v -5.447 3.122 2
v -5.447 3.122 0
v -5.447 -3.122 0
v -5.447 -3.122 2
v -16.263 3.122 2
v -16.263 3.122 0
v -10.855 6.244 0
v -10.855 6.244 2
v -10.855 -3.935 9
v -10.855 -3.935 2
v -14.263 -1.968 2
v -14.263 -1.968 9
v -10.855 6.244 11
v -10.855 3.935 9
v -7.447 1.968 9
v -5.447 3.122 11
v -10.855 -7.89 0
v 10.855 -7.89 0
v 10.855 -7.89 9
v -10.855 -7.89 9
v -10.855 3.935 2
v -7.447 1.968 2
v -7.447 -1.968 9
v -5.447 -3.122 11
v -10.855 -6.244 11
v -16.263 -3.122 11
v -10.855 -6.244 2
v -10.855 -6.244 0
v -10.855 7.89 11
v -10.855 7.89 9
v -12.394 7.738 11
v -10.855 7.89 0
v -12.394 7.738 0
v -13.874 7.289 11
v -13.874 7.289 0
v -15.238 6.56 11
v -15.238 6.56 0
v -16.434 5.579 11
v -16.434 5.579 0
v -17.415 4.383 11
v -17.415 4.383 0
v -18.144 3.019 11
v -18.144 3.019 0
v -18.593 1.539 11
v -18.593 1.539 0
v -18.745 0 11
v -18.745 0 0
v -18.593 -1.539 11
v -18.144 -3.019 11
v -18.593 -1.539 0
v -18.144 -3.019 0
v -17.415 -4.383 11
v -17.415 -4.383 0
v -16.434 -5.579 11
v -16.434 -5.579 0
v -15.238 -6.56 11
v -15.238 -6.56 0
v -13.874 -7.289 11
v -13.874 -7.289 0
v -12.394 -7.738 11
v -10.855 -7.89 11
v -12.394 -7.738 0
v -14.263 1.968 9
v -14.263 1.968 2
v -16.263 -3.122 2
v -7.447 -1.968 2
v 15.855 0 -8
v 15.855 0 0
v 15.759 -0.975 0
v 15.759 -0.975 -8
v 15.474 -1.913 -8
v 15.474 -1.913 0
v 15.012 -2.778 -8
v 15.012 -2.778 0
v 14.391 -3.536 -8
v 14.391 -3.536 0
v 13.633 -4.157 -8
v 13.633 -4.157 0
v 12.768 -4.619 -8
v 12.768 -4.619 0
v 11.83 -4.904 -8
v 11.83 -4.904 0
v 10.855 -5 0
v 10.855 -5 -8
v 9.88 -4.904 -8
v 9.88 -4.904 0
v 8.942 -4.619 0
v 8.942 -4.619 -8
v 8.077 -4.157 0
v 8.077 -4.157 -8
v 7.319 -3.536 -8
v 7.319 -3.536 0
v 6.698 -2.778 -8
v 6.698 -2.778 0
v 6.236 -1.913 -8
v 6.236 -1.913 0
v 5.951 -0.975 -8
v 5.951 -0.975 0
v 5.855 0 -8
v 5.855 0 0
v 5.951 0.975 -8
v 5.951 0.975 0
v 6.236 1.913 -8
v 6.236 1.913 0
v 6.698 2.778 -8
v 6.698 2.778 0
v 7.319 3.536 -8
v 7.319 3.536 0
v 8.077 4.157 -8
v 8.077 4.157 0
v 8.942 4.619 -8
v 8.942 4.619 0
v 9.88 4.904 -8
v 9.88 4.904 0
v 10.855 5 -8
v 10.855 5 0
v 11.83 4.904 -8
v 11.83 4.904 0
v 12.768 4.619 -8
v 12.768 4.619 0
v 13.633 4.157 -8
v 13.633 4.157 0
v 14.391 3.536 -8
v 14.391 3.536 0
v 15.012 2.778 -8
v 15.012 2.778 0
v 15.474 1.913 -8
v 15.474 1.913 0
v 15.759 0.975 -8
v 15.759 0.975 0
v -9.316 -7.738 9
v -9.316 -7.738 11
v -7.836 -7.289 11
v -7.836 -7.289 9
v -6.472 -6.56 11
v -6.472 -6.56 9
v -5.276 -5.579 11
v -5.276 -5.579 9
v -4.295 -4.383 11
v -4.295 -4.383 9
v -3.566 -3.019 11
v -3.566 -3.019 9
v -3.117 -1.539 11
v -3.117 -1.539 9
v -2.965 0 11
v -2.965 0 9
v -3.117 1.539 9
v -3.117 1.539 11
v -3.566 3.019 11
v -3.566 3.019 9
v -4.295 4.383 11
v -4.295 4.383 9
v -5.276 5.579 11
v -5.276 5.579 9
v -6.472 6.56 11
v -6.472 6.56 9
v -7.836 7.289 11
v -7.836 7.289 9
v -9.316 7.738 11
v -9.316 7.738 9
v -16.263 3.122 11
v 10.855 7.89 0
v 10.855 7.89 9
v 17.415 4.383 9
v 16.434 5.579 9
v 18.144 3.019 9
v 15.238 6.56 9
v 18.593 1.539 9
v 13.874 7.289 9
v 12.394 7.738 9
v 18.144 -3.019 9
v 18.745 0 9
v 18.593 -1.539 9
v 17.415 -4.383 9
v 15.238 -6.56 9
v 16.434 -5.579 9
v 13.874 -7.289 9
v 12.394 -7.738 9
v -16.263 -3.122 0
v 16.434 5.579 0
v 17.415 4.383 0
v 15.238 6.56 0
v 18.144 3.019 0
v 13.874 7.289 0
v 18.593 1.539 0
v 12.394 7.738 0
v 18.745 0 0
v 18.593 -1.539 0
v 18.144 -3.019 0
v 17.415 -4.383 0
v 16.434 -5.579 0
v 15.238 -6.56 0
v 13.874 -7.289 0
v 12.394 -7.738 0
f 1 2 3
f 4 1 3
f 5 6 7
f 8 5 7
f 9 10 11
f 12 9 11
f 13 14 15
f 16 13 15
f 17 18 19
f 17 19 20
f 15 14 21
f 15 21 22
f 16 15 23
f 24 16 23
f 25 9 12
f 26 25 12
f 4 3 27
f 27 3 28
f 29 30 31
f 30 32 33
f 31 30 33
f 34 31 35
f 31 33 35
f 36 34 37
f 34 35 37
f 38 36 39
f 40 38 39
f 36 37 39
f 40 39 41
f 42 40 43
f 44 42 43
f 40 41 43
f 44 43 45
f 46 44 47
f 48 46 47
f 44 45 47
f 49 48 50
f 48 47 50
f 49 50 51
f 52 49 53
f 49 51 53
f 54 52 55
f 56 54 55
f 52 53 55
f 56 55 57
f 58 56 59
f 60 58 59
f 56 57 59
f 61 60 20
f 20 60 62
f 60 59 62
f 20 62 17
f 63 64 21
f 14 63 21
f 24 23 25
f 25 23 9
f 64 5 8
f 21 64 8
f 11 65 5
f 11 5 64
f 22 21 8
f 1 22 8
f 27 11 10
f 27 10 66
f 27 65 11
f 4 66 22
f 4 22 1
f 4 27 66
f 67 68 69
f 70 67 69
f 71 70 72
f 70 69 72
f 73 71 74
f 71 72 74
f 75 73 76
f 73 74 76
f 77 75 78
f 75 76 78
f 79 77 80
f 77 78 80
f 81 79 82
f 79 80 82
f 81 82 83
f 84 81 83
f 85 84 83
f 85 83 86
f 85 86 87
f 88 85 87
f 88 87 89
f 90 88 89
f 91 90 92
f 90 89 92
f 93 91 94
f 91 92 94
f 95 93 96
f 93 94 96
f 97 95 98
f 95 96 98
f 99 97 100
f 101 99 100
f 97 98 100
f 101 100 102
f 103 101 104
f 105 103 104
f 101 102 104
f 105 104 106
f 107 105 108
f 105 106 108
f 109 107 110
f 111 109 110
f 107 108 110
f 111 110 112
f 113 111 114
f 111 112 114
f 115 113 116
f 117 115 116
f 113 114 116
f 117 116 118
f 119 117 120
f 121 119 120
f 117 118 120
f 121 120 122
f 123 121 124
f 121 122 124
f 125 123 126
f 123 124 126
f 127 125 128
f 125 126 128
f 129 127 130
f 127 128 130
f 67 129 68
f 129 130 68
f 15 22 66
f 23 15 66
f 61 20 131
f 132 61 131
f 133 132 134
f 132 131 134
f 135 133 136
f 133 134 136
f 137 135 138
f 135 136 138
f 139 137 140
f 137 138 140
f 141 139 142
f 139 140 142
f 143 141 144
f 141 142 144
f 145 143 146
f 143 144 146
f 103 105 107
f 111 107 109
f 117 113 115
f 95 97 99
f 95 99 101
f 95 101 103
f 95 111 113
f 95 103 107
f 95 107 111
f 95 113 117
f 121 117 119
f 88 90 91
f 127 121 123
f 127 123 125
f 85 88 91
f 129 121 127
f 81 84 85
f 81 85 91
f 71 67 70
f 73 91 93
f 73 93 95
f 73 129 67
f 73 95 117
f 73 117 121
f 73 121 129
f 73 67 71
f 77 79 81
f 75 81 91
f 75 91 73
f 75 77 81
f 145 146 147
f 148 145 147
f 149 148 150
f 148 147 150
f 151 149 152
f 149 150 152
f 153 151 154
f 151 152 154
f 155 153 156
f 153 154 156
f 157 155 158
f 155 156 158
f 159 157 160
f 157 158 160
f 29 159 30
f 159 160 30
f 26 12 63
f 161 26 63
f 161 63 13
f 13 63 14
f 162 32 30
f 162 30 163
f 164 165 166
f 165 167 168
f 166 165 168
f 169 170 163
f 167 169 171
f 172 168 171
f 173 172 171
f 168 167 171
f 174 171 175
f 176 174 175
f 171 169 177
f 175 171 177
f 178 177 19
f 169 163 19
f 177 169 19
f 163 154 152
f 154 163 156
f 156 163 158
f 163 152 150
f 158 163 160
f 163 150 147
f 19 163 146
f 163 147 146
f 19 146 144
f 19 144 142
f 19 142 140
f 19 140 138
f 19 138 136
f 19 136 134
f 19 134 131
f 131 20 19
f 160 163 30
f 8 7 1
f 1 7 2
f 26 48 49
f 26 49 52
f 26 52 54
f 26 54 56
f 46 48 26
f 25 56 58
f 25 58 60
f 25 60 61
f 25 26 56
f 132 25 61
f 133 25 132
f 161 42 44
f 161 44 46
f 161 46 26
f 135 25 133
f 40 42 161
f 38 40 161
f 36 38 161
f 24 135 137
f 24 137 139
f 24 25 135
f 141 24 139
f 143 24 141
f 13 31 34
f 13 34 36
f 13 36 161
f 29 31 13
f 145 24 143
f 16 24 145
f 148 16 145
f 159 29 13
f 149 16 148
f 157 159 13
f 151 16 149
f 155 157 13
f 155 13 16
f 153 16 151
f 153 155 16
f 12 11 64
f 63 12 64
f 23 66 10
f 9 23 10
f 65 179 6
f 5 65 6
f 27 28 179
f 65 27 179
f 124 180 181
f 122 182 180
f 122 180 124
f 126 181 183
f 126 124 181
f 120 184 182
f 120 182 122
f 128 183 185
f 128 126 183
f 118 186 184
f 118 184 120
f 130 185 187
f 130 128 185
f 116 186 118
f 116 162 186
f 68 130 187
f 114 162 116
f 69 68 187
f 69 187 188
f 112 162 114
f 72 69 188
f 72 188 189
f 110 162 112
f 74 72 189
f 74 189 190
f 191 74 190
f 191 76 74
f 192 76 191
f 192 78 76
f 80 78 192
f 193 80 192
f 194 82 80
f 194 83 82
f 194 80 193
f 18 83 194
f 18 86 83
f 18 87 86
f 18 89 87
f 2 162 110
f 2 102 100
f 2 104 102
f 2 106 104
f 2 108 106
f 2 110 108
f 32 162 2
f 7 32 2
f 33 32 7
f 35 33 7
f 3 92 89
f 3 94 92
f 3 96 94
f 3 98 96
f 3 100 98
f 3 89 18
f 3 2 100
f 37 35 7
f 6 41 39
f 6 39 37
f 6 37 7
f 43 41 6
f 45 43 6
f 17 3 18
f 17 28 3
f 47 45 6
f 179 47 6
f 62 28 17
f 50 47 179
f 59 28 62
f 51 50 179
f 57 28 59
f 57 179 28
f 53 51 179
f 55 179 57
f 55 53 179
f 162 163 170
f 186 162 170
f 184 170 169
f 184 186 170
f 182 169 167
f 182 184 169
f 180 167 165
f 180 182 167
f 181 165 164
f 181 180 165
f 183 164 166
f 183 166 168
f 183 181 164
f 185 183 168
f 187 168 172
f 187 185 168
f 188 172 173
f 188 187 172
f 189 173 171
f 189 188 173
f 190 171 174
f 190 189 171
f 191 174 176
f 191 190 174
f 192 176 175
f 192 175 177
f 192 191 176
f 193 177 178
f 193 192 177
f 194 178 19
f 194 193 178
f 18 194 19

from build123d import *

# Parameters (mm, degrees)
BOSS_EXTRU_1_DEPTH      = 9
ESQUISSE3_R             = 5
BOSS_EXTRU_3_DEPTH      = 8
ENL_V_MAT_EXTRU_1_DEPTH = 27.507114611
ENL_V_MAT_EXTRU_2_DEPTH = 2
BOSS_EXTRU_4_DEPTH      = 2
CHANFREIN1_SIZE         = 2


with BuildPart() as part:
    # Esquisse1 → Boss.-Extru.1 (new body)
    with BuildSketch(Plane(origin=(0, 0, 0), x_dir=(0, 1, 0), z_dir=(0, 0, 1))):
        with BuildLine():
            Line((-7.89, -10.855), (-7.89, 10.855))
            ThreePointArc((-7.89, 10.855), (0, 18.745), (7.89, 10.855))
            Line((7.89, 10.855), (7.89, -10.855))
            ThreePointArc((7.89, -10.855), (0, -18.745), (-7.89, -10.855))
        make_face()
    extrude(amount=BOSS_EXTRU_1_DEPTH)

    # Esquisse3 → Boss.-Extru.3 (add)
    with BuildSketch(Plane(origin=(0, 0, 0), x_dir=(1, 0, 0), z_dir=(0, 0, -1))):
        with Locations((10.855, 0)):
            Circle(ESQUISSE3_R)
    extrude(amount=BOSS_EXTRU_3_DEPTH)

    # Esquisse2 → Enlèv. mat.-Extru.1 (cut, through all)
    with BuildSketch(Plane.XY.offset(9)):
        Polygon((-10.855, 3.935), (-14.262809964, 1.9675), (-14.262809964, -1.9675), (-10.855, -3.935), (-7.447190036, -1.9675), (-7.447190036, 1.9675), align=None)
    extrude(amount=-ENL_V_MAT_EXTRU_1_DEPTH, mode=Mode.SUBTRACT)

    # Esquisse4 → Enlèv. mat.-Extru.2 (cut)
    with BuildSketch(Plane(origin=(0, 0, 0), x_dir=(1, 0, 0), z_dir=(0, 0, -1))):
        Polygon((-5.447190036, -3.122200538), (-5.447190036, 3.122200538), (-10.855, 6.244401077), (-16.262809964, 3.122200538), (-16.262809964, -3.122200538), (-10.855, -6.244401077), align=None)
    extrude(amount=-ENL_V_MAT_EXTRU_2_DEPTH, mode=Mode.SUBTRACT)

    # Esquisse5 → Boss.-Extru.4 (add)
    with BuildSketch(Plane.XY.offset(9)):
        with BuildLine():
            ThreePointArc((-10.855, -7.89), (-5.275927496, -5.579072504), (-2.965, 0))
            ThreePointArc((-2.965, 0), (-5.275927496, 5.579072504), (-10.855, 7.89))
            ThreePointArc((-10.855, 7.89), (-18.745, 0), (-10.855, -7.89))
        make_face()
        Polygon((-10.855, 3.935), (-7.447190036, 1.9675), (-7.447190036, -1.9675), (-10.855, -3.935), (-14.262809964, -1.9675), (-14.262809964, 1.9675), align=None, mode=Mode.SUBTRACT)
    extrude(amount=BOSS_EXTRU_4_DEPTH)

    # Chanfrein1
    chanfrein1_edges = [part.edges().sort_by_distance(p)[0] for p in [
        (-9.151095018, 2.95125, 11),
        (-7.447190036, 0, 11),
        (-9.151095018, -2.95125, 11),
        (-12.558904982, -2.95125, 11),
        (-14.262809964, 0, 11),
        (-12.558904982, 2.95125, 11),
    ]]
    chamfer(chanfrein1_edges, length=CHANFREIN1_SIZE - 0.0001)  # a hair under: the kernel refuses the full size


solid = part.part
